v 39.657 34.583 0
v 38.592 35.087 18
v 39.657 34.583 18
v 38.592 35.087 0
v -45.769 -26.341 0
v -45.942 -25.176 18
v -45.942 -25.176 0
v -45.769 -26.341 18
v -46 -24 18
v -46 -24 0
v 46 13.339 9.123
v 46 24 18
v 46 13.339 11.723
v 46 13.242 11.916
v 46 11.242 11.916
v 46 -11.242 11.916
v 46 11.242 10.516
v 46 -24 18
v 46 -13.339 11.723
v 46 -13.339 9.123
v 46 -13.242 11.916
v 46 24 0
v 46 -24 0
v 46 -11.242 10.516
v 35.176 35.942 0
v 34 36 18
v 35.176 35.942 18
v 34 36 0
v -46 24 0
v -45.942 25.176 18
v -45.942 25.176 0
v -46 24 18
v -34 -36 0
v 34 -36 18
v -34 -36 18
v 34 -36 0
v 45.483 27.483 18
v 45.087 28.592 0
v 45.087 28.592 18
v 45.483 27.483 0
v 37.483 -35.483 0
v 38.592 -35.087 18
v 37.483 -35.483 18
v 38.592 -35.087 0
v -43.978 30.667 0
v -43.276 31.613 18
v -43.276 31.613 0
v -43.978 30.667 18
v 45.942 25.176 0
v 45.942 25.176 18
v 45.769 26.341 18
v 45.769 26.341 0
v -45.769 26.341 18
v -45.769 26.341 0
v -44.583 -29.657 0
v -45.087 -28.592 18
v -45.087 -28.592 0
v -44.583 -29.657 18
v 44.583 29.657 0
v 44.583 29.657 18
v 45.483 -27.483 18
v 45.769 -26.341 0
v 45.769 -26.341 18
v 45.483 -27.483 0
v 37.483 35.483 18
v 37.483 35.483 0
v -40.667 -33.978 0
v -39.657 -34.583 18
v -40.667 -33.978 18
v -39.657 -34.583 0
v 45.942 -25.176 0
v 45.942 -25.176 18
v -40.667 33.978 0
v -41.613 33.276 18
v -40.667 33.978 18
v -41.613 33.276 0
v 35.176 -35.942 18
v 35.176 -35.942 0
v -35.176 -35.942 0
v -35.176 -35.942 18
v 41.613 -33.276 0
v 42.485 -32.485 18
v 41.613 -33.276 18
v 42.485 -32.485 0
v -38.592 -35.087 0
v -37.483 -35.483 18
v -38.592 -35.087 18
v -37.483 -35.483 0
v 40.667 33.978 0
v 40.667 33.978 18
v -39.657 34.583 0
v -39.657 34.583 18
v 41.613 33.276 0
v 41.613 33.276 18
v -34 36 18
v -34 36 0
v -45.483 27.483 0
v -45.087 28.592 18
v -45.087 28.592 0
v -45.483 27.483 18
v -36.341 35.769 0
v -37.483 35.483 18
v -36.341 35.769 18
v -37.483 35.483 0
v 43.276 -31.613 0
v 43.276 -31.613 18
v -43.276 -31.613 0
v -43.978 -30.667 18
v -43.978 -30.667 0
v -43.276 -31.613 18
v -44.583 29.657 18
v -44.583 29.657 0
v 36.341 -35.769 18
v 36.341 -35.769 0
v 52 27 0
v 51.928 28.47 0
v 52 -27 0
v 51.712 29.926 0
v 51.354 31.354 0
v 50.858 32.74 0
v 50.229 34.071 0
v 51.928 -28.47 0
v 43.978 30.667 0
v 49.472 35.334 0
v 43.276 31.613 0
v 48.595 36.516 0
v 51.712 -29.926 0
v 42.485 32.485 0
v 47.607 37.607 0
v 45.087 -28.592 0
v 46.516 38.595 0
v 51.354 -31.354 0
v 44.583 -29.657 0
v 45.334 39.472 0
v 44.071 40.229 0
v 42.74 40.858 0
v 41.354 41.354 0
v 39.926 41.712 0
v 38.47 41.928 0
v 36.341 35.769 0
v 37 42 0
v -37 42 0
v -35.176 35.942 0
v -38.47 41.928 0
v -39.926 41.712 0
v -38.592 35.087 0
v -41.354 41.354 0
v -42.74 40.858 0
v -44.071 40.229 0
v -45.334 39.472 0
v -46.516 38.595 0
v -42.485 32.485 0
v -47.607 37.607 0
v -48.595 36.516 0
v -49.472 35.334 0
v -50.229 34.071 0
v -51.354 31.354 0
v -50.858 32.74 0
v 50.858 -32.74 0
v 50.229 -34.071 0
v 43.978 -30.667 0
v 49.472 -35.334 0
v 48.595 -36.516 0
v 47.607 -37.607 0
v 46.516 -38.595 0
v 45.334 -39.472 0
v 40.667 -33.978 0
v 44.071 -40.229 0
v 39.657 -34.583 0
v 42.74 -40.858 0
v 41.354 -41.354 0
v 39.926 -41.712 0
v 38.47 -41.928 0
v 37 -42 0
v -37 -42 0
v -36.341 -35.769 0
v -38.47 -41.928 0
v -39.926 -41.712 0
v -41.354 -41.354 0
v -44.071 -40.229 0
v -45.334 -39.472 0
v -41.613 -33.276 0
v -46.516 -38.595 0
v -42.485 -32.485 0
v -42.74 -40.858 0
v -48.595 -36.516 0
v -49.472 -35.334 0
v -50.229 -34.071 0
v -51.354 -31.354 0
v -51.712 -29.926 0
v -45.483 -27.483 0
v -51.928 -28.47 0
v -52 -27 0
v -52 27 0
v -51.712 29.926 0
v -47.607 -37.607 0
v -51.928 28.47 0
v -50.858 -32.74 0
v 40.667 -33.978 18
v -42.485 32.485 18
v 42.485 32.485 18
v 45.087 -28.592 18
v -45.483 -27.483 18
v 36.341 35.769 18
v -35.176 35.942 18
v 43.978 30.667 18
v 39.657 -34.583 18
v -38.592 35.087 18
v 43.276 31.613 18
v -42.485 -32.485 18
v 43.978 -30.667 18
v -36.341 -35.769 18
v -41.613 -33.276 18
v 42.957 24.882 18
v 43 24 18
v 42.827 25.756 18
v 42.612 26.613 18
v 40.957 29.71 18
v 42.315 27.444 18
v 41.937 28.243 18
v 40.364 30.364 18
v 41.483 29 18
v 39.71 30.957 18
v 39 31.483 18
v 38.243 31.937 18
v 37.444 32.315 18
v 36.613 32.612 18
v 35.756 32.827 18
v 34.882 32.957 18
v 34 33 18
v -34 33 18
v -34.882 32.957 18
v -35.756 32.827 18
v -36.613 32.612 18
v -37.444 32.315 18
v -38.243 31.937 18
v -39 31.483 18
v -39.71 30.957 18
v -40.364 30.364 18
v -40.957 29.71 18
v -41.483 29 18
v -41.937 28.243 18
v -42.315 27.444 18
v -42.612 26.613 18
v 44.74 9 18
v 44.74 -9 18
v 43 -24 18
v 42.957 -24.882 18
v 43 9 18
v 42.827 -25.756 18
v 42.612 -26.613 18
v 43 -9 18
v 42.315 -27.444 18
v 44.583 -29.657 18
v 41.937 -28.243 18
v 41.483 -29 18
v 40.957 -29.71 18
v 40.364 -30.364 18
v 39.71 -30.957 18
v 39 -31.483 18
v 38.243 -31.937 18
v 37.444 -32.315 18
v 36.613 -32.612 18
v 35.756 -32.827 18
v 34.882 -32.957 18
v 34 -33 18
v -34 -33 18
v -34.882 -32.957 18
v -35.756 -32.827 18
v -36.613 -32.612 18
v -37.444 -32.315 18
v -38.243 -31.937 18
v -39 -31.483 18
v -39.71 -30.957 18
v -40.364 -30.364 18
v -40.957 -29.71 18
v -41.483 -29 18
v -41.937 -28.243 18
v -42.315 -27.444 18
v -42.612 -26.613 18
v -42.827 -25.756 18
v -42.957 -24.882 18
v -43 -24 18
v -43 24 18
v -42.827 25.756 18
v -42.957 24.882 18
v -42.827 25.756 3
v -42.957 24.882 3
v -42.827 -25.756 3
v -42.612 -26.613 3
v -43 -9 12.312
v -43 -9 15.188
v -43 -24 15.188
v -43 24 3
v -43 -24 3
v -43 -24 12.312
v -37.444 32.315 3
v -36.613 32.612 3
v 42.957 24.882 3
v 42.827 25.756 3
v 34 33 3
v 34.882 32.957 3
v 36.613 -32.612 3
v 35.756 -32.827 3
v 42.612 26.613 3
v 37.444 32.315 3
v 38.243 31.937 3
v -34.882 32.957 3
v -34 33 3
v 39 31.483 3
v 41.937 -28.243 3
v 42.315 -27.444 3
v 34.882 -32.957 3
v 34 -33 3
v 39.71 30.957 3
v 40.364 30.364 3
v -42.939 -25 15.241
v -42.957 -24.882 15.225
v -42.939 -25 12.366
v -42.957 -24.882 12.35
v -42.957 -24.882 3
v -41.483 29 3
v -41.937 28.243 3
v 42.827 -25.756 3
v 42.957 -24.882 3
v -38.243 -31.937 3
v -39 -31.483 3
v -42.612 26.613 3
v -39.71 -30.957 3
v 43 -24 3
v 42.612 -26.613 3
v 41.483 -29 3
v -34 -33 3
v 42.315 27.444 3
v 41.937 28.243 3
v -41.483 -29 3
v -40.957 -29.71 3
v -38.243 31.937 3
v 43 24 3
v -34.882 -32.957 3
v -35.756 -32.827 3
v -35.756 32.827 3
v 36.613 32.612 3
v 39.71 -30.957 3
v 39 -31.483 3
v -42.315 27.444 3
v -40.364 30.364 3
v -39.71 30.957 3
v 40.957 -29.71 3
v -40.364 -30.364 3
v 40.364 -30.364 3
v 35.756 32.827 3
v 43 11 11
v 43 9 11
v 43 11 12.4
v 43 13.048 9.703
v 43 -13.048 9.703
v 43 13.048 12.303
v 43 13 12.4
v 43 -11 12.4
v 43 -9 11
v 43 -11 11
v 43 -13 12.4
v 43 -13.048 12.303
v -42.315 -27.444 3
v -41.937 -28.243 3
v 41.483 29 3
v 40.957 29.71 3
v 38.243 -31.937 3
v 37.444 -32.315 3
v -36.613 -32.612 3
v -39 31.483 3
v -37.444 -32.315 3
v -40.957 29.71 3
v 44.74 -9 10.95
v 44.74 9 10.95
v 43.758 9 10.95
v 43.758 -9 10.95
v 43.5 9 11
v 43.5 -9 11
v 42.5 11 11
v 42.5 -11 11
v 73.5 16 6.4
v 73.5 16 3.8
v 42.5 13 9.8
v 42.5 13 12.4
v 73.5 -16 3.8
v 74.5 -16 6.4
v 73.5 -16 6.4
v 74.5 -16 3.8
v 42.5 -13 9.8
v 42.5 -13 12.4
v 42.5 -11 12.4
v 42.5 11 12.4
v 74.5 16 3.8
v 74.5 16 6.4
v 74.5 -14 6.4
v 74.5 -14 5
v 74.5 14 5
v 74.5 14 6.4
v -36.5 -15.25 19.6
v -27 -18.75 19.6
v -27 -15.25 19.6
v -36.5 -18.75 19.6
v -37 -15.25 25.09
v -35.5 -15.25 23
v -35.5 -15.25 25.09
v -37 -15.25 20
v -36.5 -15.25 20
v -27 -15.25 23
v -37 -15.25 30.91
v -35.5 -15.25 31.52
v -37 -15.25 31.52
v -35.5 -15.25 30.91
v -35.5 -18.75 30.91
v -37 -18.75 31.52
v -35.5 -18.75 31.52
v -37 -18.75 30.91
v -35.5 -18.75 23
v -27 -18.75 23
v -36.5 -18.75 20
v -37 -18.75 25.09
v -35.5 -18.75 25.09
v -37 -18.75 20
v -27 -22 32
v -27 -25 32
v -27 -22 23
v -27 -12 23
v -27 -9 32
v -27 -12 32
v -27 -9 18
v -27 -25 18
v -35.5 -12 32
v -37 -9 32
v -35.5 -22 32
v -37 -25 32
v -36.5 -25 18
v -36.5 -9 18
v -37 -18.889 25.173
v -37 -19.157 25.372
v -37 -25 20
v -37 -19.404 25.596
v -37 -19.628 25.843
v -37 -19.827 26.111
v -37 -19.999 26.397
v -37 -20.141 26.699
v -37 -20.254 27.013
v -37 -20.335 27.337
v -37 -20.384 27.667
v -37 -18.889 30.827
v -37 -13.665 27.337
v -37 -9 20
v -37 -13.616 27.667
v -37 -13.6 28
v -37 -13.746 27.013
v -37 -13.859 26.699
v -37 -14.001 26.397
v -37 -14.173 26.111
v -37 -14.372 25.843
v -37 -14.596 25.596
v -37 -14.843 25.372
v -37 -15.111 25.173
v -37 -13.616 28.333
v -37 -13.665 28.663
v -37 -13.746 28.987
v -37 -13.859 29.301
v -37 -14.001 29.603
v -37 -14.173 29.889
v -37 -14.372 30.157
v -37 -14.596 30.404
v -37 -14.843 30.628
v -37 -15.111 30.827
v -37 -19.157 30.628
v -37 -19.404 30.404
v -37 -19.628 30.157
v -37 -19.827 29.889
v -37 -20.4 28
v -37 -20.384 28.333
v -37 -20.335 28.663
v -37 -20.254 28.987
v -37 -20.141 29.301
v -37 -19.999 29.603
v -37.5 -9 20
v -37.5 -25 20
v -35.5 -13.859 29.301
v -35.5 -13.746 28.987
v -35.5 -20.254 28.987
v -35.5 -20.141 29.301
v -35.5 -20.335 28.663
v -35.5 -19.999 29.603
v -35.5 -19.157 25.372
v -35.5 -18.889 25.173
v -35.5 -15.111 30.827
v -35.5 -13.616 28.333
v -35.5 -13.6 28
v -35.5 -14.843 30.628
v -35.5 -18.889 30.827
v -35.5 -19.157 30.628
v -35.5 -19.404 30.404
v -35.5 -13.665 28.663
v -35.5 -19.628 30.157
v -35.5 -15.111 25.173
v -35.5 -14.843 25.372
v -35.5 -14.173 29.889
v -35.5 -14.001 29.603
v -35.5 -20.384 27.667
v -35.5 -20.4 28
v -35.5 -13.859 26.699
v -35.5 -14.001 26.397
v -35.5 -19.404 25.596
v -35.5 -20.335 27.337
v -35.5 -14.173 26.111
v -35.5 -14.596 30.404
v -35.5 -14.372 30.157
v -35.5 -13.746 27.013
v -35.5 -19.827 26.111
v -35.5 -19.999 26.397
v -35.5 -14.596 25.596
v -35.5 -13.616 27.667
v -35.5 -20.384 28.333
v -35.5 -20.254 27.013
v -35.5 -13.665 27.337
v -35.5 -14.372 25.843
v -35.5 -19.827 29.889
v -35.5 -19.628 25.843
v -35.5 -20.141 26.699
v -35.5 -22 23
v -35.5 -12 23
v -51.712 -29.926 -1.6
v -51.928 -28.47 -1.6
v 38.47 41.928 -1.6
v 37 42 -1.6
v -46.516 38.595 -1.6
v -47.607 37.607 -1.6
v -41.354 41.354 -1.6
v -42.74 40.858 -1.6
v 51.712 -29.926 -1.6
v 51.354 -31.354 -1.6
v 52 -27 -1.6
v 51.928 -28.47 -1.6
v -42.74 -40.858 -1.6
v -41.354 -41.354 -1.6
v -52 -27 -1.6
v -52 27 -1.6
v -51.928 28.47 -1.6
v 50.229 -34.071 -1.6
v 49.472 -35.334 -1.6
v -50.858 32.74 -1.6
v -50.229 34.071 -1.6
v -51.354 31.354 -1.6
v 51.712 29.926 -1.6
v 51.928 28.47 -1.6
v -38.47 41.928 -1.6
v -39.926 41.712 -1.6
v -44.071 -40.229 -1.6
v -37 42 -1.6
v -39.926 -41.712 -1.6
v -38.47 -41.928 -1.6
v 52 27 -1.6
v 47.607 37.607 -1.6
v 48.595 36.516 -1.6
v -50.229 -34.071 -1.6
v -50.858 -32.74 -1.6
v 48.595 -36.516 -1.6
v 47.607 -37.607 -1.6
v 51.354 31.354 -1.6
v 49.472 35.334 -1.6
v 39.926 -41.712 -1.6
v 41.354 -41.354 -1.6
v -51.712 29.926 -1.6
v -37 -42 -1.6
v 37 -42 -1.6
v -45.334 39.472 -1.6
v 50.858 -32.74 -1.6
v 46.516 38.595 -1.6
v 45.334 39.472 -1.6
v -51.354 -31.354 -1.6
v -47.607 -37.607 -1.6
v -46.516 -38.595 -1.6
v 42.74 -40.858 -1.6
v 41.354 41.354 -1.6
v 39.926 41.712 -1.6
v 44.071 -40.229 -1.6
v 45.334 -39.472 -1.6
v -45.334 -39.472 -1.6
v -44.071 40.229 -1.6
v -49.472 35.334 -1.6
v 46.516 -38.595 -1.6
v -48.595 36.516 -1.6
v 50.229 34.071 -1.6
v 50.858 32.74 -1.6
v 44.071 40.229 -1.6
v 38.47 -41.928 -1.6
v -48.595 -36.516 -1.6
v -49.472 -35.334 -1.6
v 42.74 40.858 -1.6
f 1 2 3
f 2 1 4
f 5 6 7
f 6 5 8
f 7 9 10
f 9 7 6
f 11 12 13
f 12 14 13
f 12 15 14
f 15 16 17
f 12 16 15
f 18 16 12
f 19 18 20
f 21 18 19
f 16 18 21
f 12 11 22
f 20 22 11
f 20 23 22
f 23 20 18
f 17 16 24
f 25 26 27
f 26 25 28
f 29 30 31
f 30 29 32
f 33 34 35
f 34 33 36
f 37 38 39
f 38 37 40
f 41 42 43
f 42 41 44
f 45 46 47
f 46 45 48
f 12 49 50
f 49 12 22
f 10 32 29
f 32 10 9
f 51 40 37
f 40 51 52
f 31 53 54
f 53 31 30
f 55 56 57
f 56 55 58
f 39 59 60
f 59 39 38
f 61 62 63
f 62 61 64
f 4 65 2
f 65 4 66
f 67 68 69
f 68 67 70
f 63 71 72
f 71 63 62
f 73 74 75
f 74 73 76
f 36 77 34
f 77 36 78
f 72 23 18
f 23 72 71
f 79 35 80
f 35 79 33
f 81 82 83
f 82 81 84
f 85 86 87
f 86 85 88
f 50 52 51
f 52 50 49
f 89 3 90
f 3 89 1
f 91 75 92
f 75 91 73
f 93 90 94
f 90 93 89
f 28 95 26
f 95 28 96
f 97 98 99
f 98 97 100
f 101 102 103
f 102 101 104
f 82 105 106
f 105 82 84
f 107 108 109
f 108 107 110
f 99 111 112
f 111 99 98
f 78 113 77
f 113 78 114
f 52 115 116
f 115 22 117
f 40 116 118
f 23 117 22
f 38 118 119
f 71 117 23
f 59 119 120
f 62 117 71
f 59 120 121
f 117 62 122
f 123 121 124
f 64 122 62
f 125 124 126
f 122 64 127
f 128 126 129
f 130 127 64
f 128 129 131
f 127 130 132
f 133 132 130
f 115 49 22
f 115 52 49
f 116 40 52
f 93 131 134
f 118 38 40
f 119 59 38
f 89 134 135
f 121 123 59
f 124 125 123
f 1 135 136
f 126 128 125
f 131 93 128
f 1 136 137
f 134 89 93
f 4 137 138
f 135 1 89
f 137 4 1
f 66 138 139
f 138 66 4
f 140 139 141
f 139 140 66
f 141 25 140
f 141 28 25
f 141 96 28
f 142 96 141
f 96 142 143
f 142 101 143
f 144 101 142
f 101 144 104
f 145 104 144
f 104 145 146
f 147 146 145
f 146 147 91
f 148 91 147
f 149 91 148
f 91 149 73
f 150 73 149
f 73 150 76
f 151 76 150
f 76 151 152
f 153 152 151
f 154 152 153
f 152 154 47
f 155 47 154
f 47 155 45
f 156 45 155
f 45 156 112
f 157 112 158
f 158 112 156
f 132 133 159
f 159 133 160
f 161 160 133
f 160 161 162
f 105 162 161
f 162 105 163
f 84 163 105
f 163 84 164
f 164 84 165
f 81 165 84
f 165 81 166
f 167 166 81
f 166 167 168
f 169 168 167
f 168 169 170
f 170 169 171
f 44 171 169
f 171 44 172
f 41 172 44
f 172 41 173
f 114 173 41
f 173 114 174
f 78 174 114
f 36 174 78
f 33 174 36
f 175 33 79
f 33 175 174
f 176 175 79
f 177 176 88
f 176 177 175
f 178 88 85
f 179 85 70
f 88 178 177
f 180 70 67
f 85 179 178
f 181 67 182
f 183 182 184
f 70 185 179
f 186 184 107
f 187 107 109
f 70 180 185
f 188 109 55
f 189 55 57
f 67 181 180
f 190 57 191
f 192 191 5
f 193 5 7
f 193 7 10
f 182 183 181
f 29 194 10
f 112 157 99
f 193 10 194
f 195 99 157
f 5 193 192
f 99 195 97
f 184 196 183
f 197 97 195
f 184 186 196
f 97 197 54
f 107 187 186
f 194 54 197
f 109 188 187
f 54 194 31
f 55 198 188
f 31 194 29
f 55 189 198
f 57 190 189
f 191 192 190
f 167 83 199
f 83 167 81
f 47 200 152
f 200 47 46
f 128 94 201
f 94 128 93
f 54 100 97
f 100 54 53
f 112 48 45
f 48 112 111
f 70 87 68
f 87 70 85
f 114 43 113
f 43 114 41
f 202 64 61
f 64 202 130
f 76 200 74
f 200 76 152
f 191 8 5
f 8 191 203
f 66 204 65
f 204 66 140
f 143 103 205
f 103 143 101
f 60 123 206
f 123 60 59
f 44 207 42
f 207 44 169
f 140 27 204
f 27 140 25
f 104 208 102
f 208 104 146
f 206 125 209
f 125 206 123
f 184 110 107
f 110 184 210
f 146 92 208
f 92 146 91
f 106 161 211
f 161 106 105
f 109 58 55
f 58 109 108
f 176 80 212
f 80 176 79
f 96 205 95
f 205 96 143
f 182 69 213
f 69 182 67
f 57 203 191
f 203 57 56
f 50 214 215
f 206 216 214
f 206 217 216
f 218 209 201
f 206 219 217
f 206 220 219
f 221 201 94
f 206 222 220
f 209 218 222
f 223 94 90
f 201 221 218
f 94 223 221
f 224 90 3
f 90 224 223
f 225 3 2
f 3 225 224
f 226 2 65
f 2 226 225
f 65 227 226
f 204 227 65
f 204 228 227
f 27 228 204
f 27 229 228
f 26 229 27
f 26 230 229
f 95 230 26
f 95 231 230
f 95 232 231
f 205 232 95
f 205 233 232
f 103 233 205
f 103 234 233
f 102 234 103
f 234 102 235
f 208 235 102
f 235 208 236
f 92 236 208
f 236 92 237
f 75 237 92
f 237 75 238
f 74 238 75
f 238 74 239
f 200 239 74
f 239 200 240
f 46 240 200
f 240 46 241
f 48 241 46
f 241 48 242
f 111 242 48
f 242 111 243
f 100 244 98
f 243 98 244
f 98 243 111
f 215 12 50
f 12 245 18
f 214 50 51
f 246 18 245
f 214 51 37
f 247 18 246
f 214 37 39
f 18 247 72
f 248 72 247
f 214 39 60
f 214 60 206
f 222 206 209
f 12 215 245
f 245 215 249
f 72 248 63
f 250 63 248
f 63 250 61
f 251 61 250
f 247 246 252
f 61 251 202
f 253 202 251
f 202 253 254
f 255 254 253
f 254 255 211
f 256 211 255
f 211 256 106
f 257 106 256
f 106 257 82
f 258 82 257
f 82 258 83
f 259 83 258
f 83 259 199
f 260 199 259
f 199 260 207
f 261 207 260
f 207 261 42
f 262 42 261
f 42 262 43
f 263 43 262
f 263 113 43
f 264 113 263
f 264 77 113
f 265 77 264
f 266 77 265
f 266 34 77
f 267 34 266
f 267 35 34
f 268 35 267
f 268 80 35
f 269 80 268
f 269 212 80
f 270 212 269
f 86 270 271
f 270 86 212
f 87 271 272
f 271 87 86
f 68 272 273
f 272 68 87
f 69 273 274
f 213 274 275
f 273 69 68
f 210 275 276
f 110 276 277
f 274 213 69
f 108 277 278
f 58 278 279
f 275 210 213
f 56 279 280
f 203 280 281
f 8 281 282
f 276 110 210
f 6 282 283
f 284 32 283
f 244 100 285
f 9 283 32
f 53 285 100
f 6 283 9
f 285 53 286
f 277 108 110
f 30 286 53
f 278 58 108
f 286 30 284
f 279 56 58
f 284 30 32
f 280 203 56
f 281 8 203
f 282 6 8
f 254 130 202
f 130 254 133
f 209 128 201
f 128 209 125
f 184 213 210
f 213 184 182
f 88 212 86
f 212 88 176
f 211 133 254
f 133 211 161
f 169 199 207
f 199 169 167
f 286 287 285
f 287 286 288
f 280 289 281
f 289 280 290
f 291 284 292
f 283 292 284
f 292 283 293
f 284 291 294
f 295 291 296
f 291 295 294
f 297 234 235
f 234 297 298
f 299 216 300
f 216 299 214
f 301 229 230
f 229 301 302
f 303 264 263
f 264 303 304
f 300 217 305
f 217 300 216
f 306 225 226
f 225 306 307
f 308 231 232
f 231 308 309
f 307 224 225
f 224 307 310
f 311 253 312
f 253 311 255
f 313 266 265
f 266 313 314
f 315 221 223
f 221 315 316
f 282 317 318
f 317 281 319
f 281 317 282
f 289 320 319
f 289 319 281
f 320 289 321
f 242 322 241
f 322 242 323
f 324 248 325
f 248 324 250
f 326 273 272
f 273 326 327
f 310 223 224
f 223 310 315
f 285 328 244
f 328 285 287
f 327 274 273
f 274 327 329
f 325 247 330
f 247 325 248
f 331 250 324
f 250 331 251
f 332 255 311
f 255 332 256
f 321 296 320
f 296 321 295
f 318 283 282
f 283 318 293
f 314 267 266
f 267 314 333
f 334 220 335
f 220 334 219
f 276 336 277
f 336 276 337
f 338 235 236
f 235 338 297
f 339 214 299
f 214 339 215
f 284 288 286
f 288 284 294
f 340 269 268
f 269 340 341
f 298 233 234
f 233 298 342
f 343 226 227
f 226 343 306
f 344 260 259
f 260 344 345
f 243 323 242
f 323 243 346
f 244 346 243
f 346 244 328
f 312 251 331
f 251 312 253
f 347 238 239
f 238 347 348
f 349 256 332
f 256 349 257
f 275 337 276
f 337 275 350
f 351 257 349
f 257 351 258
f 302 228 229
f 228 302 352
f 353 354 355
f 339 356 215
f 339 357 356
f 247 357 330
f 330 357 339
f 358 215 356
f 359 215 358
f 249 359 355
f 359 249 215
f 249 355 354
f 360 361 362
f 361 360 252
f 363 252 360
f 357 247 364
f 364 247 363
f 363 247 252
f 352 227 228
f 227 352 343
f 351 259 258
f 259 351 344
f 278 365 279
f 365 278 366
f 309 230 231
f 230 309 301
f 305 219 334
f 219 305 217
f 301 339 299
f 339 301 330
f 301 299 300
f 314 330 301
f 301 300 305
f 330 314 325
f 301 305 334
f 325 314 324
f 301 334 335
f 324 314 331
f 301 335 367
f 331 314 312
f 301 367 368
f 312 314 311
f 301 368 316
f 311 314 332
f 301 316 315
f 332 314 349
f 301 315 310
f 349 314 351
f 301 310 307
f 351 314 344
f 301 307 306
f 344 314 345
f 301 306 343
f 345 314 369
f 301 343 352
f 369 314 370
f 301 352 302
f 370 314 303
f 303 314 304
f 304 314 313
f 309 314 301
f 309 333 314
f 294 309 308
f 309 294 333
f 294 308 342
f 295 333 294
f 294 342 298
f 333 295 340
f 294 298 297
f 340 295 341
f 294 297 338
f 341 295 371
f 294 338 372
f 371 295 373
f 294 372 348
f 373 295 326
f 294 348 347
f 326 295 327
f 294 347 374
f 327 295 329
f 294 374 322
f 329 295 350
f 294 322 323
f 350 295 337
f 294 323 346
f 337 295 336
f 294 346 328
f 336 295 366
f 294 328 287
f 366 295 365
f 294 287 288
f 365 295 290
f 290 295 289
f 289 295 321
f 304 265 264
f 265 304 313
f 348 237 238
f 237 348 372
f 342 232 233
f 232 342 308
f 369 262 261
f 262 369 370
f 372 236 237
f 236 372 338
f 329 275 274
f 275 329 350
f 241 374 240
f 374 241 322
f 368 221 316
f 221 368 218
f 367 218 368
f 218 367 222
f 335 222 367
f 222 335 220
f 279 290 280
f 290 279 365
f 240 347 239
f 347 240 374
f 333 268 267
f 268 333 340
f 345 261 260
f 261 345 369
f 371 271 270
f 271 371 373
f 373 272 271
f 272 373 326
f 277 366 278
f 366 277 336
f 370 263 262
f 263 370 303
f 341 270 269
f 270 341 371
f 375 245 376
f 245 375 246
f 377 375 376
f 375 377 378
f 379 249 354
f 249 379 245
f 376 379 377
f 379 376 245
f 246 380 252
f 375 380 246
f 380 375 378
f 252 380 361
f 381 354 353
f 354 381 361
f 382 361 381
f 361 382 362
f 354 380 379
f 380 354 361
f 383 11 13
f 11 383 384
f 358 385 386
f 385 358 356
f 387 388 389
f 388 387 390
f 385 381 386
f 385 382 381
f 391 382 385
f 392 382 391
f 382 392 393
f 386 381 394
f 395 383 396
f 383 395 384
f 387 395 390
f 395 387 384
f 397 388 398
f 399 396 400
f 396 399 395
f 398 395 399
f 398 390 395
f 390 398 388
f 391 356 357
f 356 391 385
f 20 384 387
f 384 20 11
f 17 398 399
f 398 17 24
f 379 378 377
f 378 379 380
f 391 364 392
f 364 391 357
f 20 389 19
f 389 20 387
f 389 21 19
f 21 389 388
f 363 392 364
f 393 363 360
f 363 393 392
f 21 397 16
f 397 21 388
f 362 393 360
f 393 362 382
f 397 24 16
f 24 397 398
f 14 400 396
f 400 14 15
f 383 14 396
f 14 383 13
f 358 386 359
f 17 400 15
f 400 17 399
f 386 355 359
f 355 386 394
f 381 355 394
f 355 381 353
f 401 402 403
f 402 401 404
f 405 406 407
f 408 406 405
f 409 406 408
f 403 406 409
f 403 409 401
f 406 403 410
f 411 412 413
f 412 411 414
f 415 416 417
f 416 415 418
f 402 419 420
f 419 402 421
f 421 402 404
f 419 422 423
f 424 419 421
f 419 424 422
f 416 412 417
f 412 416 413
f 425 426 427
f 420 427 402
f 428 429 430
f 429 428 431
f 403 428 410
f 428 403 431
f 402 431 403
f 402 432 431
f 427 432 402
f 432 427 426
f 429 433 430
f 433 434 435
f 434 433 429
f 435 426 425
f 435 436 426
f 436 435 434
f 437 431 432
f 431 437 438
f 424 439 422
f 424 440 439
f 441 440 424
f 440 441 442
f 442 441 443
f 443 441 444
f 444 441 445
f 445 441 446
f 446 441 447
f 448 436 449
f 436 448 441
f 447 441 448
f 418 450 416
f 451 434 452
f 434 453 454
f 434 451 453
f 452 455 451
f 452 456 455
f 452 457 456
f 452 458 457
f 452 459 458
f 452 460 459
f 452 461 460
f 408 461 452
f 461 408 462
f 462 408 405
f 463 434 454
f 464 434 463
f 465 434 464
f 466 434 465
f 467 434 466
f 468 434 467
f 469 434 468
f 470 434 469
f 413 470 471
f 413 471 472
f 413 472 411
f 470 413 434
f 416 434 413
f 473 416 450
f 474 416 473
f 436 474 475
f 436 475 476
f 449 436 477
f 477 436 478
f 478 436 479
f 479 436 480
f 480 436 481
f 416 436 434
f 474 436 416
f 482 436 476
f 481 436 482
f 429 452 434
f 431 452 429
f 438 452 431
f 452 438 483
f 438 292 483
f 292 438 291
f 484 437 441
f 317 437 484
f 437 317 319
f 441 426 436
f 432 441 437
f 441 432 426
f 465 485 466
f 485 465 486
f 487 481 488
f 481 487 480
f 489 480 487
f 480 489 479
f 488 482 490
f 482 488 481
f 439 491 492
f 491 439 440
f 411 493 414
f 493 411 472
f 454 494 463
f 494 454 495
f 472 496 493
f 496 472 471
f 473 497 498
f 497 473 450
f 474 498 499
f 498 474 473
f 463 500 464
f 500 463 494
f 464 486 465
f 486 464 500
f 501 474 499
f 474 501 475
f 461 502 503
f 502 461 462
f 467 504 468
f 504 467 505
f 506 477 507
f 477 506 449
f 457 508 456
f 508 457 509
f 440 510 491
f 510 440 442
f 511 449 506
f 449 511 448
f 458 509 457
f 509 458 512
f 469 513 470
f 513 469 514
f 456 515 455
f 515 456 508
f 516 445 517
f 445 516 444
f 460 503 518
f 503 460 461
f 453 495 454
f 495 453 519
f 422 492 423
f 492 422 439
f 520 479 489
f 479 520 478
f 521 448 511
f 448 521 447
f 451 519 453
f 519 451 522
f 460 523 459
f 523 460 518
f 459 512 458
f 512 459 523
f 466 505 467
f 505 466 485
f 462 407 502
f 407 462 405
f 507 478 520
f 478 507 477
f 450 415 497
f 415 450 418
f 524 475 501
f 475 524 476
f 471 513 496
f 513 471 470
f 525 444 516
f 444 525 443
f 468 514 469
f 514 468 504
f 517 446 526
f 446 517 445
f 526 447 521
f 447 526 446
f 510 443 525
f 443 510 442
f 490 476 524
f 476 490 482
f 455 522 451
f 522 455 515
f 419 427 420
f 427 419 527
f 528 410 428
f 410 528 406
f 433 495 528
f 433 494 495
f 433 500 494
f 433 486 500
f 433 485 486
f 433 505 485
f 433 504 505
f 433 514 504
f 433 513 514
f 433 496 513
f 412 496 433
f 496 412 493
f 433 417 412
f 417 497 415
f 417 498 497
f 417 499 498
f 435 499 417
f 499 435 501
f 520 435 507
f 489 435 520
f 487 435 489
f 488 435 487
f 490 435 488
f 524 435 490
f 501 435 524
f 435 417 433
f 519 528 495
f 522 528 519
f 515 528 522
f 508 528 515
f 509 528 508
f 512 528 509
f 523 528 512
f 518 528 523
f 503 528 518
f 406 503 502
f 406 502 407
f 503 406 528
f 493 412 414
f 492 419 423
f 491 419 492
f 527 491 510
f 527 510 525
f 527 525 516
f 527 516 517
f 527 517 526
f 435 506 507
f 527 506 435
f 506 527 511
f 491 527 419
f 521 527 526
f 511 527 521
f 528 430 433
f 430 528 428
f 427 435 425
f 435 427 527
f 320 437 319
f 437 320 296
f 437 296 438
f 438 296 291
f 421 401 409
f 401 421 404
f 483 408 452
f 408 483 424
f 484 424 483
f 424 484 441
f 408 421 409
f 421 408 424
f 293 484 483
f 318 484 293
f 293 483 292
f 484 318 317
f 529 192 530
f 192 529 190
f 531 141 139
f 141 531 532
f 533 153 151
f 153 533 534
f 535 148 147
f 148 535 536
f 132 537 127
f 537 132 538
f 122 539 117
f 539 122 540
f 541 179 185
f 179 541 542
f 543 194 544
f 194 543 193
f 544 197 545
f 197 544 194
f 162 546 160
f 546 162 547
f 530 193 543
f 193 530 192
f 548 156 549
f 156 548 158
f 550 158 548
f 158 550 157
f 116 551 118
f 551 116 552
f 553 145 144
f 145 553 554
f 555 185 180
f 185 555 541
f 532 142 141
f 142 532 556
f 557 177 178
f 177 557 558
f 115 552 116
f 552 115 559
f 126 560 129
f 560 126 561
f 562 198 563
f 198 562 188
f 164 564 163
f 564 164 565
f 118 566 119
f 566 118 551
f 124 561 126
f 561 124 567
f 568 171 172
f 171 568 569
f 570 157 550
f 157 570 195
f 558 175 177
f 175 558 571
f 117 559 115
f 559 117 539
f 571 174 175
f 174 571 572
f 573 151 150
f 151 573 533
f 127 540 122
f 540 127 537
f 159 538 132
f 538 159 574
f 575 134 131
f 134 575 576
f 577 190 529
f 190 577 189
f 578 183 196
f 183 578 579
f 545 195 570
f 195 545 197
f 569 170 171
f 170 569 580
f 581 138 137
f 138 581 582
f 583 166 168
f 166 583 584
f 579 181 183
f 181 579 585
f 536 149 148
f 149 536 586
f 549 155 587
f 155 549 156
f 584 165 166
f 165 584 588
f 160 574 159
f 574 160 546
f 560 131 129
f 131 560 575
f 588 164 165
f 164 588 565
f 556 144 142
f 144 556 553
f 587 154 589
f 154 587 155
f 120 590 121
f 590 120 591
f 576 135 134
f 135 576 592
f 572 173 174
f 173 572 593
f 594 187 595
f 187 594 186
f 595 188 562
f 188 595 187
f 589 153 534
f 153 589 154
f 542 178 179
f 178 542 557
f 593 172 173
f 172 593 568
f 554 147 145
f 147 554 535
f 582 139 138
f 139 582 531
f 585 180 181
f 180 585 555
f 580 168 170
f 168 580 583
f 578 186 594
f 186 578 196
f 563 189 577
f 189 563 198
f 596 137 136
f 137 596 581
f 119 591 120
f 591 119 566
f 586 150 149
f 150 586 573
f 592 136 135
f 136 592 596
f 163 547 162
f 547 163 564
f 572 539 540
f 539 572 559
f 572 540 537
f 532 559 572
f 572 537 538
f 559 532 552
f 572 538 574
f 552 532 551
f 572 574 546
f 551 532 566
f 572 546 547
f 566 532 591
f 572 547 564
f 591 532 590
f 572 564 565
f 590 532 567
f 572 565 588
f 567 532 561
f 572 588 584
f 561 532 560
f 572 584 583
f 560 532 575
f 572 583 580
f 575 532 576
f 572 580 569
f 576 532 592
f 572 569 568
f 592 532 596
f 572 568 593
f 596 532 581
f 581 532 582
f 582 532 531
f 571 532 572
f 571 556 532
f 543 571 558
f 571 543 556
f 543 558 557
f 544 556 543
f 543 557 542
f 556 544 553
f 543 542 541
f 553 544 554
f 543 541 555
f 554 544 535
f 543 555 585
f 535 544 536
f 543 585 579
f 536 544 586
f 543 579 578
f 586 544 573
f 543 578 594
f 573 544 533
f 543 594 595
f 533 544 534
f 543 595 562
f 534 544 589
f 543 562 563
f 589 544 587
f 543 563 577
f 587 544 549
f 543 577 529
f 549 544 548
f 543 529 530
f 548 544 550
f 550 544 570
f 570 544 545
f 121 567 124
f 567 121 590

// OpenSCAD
// Gecko Automation - Automatic Water Bowl
// Parametric OpenSCAD model for a shallow leopard gecko water bowl
// with controlled overflow and a simple tubing guide.
//
// Design goals:
// - shallow enough for easy drinking
// - overflow notch fixes water level
// - external spillway directs overflow toward substrate / humid hide side
// - inlet guide holds silicone tube aimed tangentially for a gentle swirl rinse
// - prints without supports in the default orientation
//
// Suggested print settings:
// - PETG recommended
// - 0.2mm layer height
// - 4-5 perimeters
// - 100% infill, or seal afterward with food-safe epoxy if needed
// - if using PLA, keep away from hotter basking zones

$fn = 64;

/* [Main dimensions] */
outer_len = 92;
outer_wid = 72;
outer_h = 18;
corner_r = 12;
wall = 3;
floor_thickness = 3;

/* [Water geometry] */
water_depth = 8;          // final water depth above floor
overflow_width = 18;
overflow_guard = 5;       // keeps notch away from corners
spillway_len = 28;
spillway_drop = 6;
spillway_wall = 2;

/* [Tube guide] */
tube_od = 6;              // common silicone tubing OD
clip_wall = 3;
clip_height_above_rim = 14;
clip_width = 16;
clip_depth = 10;
zip_tie_slot_w = 3.5;
zip_tie_slot_h = 8;

/* [Optional base] */
add_base_pad = true;
base_pad_thickness = 1.6;
base_pad_margin = 6;

module rounded_rect_2d(len, wid, r) {
    hull() {
        for (x = [-len/2 + r, len/2 - r])
            for (y = [-wid/2 + r, wid/2 - r])
                translate([x, y]) circle(r = r);
    }
}

module bowl_shell() {
    difference() {
        // Outer shell
        linear_extrude(height = outer_h)
            rounded_rect_2d(outer_len, outer_wid, corner_r);

        // Inner cavity
        translate([0, 0, floor_thickness])
            linear_extrude(height = outer_h)
                rounded_rect_2d(
                    outer_len - 2*wall,
                    outer_wid - 2*wall,
                    max(1, corner_r - wall)
                );

        // Overflow notch on the right side
        overflow_bottom_z = floor_thickness + water_depth;
        translate([
            outer_len/2 - wall - 0.01,
            0,
            overflow_bottom_z + (outer_h - overflow_bottom_z)/2
        ])
            cube([
                wall + 0.5,
                overflow_width,
                outer_h - overflow_bottom_z + 0.1
            ], center = true);
    }
}

module spillway() {
    // Open spill ramp that carries overflow away from the bowl wall.
    // Slightly flared and sloped down.
    start_x = outer_len/2 - wall;
    end_x = outer_len/2 + spillway_len;
    start_z = floor_thickness + water_depth - 0.6;
    end_z = max(1.2, start_z - spillway_drop);
    width = overflow_width + 8;

    // floor of spillway
    hull() {
        translate([start_x, 0, start_z])
            cube([1, width, 1.2], center = true);
        translate([end_x, 0, end_z])
            cube([1, width + 6, 1.2], center = true);
    }

    // left side rail
    hull() {
        translate([start_x, -(width/2 - spillway_wall/2), start_z + spillway_wall/2])
            cube([1, spillway_wall, spillway_wall], center = true);
        translate([end_x, -((width + 6)/2 - spillway_wall/2), end_z + spillway_wall/2])
            cube([1, spillway_wall, spillway_wall], center = true);
    }

    // right side rail
    hull() {
        translate([start_x, (width/2 - spillway_wall/2), start_z + spillway_wall/2])
            cube([1, spillway_wall, spillway_wall], center = true);
        translate([end_x, ((width + 6)/2 - spillway_wall/2), end_z + spillway_wall/2])
            cube([1, spillway_wall, spillway_wall], center = true);
    }
}

module tube_guide() {
    // Simple rear-left guide with zip-tie slots.
    guide_x = -outer_len/2 + wall + clip_depth/2 + 6;
    guide_y = -outer_wid/2 + wall + clip_width/2 + 8;
    guide_z = outer_h;
    guide_h = clip_height_above_rim;

    difference() {
        // body
        translate([guide_x, guide_y, guide_z + guide_h/2])
            cube([clip_depth, clip_width, guide_h], center = true);

        // half-round tube saddle at the top
        translate([guide_x - clip_depth/2 - 0.01, guide_y, guide_z + guide_h - tube_od/2 - 1])
            rotate([0, 90, 0])
                cylinder(h = clip_depth + 0.2, d = tube_od + 0.8, center = false);

        // front opening to turn saddle into an open notch
        translate([guide_x + 1.5, guide_y, guide_z + guide_h - tube_od/2 - 1])
            cube([clip_depth, tube_od + 4, tube_od + 4], center = true);

        // zip tie slots
        for (zslot = [guide_z + guide_h*0.40, guide_z + guide_h*0.68]) {
            translate([guide_x, guide_y, zslot])
                cube([clip_depth + 0.2, zip_tie_slot_w, zip_tie_slot_h], center = true);
        }
    }

    // small gusset to reinforce guide
    hull() {
        translate([guide_x - clip_depth/2, guide_y, outer_h + 1])
            cube([1, clip_width, 2], center = true);
        translate([guide_x - clip_depth/2 - 8, guide_y, outer_h - 6])
            cube([1, clip_width, 2], center = true);
    }
}

module base_pad() {
    if (add_base_pad) {
        translate([0, 0, -base_pad_thickness])
            linear_extrude(height = base_pad_thickness)
                rounded_rect_2d(
                    outer_len + 2*base_pad_margin,
                    outer_wid + 2*base_pad_margin,
                    corner_r + base_pad_margin/2
                );
    }
}

module assembly() {
    union() {
        base_pad();
        bowl_shell();
        spillway();
        tube_guide();
    }
}

assembly();
